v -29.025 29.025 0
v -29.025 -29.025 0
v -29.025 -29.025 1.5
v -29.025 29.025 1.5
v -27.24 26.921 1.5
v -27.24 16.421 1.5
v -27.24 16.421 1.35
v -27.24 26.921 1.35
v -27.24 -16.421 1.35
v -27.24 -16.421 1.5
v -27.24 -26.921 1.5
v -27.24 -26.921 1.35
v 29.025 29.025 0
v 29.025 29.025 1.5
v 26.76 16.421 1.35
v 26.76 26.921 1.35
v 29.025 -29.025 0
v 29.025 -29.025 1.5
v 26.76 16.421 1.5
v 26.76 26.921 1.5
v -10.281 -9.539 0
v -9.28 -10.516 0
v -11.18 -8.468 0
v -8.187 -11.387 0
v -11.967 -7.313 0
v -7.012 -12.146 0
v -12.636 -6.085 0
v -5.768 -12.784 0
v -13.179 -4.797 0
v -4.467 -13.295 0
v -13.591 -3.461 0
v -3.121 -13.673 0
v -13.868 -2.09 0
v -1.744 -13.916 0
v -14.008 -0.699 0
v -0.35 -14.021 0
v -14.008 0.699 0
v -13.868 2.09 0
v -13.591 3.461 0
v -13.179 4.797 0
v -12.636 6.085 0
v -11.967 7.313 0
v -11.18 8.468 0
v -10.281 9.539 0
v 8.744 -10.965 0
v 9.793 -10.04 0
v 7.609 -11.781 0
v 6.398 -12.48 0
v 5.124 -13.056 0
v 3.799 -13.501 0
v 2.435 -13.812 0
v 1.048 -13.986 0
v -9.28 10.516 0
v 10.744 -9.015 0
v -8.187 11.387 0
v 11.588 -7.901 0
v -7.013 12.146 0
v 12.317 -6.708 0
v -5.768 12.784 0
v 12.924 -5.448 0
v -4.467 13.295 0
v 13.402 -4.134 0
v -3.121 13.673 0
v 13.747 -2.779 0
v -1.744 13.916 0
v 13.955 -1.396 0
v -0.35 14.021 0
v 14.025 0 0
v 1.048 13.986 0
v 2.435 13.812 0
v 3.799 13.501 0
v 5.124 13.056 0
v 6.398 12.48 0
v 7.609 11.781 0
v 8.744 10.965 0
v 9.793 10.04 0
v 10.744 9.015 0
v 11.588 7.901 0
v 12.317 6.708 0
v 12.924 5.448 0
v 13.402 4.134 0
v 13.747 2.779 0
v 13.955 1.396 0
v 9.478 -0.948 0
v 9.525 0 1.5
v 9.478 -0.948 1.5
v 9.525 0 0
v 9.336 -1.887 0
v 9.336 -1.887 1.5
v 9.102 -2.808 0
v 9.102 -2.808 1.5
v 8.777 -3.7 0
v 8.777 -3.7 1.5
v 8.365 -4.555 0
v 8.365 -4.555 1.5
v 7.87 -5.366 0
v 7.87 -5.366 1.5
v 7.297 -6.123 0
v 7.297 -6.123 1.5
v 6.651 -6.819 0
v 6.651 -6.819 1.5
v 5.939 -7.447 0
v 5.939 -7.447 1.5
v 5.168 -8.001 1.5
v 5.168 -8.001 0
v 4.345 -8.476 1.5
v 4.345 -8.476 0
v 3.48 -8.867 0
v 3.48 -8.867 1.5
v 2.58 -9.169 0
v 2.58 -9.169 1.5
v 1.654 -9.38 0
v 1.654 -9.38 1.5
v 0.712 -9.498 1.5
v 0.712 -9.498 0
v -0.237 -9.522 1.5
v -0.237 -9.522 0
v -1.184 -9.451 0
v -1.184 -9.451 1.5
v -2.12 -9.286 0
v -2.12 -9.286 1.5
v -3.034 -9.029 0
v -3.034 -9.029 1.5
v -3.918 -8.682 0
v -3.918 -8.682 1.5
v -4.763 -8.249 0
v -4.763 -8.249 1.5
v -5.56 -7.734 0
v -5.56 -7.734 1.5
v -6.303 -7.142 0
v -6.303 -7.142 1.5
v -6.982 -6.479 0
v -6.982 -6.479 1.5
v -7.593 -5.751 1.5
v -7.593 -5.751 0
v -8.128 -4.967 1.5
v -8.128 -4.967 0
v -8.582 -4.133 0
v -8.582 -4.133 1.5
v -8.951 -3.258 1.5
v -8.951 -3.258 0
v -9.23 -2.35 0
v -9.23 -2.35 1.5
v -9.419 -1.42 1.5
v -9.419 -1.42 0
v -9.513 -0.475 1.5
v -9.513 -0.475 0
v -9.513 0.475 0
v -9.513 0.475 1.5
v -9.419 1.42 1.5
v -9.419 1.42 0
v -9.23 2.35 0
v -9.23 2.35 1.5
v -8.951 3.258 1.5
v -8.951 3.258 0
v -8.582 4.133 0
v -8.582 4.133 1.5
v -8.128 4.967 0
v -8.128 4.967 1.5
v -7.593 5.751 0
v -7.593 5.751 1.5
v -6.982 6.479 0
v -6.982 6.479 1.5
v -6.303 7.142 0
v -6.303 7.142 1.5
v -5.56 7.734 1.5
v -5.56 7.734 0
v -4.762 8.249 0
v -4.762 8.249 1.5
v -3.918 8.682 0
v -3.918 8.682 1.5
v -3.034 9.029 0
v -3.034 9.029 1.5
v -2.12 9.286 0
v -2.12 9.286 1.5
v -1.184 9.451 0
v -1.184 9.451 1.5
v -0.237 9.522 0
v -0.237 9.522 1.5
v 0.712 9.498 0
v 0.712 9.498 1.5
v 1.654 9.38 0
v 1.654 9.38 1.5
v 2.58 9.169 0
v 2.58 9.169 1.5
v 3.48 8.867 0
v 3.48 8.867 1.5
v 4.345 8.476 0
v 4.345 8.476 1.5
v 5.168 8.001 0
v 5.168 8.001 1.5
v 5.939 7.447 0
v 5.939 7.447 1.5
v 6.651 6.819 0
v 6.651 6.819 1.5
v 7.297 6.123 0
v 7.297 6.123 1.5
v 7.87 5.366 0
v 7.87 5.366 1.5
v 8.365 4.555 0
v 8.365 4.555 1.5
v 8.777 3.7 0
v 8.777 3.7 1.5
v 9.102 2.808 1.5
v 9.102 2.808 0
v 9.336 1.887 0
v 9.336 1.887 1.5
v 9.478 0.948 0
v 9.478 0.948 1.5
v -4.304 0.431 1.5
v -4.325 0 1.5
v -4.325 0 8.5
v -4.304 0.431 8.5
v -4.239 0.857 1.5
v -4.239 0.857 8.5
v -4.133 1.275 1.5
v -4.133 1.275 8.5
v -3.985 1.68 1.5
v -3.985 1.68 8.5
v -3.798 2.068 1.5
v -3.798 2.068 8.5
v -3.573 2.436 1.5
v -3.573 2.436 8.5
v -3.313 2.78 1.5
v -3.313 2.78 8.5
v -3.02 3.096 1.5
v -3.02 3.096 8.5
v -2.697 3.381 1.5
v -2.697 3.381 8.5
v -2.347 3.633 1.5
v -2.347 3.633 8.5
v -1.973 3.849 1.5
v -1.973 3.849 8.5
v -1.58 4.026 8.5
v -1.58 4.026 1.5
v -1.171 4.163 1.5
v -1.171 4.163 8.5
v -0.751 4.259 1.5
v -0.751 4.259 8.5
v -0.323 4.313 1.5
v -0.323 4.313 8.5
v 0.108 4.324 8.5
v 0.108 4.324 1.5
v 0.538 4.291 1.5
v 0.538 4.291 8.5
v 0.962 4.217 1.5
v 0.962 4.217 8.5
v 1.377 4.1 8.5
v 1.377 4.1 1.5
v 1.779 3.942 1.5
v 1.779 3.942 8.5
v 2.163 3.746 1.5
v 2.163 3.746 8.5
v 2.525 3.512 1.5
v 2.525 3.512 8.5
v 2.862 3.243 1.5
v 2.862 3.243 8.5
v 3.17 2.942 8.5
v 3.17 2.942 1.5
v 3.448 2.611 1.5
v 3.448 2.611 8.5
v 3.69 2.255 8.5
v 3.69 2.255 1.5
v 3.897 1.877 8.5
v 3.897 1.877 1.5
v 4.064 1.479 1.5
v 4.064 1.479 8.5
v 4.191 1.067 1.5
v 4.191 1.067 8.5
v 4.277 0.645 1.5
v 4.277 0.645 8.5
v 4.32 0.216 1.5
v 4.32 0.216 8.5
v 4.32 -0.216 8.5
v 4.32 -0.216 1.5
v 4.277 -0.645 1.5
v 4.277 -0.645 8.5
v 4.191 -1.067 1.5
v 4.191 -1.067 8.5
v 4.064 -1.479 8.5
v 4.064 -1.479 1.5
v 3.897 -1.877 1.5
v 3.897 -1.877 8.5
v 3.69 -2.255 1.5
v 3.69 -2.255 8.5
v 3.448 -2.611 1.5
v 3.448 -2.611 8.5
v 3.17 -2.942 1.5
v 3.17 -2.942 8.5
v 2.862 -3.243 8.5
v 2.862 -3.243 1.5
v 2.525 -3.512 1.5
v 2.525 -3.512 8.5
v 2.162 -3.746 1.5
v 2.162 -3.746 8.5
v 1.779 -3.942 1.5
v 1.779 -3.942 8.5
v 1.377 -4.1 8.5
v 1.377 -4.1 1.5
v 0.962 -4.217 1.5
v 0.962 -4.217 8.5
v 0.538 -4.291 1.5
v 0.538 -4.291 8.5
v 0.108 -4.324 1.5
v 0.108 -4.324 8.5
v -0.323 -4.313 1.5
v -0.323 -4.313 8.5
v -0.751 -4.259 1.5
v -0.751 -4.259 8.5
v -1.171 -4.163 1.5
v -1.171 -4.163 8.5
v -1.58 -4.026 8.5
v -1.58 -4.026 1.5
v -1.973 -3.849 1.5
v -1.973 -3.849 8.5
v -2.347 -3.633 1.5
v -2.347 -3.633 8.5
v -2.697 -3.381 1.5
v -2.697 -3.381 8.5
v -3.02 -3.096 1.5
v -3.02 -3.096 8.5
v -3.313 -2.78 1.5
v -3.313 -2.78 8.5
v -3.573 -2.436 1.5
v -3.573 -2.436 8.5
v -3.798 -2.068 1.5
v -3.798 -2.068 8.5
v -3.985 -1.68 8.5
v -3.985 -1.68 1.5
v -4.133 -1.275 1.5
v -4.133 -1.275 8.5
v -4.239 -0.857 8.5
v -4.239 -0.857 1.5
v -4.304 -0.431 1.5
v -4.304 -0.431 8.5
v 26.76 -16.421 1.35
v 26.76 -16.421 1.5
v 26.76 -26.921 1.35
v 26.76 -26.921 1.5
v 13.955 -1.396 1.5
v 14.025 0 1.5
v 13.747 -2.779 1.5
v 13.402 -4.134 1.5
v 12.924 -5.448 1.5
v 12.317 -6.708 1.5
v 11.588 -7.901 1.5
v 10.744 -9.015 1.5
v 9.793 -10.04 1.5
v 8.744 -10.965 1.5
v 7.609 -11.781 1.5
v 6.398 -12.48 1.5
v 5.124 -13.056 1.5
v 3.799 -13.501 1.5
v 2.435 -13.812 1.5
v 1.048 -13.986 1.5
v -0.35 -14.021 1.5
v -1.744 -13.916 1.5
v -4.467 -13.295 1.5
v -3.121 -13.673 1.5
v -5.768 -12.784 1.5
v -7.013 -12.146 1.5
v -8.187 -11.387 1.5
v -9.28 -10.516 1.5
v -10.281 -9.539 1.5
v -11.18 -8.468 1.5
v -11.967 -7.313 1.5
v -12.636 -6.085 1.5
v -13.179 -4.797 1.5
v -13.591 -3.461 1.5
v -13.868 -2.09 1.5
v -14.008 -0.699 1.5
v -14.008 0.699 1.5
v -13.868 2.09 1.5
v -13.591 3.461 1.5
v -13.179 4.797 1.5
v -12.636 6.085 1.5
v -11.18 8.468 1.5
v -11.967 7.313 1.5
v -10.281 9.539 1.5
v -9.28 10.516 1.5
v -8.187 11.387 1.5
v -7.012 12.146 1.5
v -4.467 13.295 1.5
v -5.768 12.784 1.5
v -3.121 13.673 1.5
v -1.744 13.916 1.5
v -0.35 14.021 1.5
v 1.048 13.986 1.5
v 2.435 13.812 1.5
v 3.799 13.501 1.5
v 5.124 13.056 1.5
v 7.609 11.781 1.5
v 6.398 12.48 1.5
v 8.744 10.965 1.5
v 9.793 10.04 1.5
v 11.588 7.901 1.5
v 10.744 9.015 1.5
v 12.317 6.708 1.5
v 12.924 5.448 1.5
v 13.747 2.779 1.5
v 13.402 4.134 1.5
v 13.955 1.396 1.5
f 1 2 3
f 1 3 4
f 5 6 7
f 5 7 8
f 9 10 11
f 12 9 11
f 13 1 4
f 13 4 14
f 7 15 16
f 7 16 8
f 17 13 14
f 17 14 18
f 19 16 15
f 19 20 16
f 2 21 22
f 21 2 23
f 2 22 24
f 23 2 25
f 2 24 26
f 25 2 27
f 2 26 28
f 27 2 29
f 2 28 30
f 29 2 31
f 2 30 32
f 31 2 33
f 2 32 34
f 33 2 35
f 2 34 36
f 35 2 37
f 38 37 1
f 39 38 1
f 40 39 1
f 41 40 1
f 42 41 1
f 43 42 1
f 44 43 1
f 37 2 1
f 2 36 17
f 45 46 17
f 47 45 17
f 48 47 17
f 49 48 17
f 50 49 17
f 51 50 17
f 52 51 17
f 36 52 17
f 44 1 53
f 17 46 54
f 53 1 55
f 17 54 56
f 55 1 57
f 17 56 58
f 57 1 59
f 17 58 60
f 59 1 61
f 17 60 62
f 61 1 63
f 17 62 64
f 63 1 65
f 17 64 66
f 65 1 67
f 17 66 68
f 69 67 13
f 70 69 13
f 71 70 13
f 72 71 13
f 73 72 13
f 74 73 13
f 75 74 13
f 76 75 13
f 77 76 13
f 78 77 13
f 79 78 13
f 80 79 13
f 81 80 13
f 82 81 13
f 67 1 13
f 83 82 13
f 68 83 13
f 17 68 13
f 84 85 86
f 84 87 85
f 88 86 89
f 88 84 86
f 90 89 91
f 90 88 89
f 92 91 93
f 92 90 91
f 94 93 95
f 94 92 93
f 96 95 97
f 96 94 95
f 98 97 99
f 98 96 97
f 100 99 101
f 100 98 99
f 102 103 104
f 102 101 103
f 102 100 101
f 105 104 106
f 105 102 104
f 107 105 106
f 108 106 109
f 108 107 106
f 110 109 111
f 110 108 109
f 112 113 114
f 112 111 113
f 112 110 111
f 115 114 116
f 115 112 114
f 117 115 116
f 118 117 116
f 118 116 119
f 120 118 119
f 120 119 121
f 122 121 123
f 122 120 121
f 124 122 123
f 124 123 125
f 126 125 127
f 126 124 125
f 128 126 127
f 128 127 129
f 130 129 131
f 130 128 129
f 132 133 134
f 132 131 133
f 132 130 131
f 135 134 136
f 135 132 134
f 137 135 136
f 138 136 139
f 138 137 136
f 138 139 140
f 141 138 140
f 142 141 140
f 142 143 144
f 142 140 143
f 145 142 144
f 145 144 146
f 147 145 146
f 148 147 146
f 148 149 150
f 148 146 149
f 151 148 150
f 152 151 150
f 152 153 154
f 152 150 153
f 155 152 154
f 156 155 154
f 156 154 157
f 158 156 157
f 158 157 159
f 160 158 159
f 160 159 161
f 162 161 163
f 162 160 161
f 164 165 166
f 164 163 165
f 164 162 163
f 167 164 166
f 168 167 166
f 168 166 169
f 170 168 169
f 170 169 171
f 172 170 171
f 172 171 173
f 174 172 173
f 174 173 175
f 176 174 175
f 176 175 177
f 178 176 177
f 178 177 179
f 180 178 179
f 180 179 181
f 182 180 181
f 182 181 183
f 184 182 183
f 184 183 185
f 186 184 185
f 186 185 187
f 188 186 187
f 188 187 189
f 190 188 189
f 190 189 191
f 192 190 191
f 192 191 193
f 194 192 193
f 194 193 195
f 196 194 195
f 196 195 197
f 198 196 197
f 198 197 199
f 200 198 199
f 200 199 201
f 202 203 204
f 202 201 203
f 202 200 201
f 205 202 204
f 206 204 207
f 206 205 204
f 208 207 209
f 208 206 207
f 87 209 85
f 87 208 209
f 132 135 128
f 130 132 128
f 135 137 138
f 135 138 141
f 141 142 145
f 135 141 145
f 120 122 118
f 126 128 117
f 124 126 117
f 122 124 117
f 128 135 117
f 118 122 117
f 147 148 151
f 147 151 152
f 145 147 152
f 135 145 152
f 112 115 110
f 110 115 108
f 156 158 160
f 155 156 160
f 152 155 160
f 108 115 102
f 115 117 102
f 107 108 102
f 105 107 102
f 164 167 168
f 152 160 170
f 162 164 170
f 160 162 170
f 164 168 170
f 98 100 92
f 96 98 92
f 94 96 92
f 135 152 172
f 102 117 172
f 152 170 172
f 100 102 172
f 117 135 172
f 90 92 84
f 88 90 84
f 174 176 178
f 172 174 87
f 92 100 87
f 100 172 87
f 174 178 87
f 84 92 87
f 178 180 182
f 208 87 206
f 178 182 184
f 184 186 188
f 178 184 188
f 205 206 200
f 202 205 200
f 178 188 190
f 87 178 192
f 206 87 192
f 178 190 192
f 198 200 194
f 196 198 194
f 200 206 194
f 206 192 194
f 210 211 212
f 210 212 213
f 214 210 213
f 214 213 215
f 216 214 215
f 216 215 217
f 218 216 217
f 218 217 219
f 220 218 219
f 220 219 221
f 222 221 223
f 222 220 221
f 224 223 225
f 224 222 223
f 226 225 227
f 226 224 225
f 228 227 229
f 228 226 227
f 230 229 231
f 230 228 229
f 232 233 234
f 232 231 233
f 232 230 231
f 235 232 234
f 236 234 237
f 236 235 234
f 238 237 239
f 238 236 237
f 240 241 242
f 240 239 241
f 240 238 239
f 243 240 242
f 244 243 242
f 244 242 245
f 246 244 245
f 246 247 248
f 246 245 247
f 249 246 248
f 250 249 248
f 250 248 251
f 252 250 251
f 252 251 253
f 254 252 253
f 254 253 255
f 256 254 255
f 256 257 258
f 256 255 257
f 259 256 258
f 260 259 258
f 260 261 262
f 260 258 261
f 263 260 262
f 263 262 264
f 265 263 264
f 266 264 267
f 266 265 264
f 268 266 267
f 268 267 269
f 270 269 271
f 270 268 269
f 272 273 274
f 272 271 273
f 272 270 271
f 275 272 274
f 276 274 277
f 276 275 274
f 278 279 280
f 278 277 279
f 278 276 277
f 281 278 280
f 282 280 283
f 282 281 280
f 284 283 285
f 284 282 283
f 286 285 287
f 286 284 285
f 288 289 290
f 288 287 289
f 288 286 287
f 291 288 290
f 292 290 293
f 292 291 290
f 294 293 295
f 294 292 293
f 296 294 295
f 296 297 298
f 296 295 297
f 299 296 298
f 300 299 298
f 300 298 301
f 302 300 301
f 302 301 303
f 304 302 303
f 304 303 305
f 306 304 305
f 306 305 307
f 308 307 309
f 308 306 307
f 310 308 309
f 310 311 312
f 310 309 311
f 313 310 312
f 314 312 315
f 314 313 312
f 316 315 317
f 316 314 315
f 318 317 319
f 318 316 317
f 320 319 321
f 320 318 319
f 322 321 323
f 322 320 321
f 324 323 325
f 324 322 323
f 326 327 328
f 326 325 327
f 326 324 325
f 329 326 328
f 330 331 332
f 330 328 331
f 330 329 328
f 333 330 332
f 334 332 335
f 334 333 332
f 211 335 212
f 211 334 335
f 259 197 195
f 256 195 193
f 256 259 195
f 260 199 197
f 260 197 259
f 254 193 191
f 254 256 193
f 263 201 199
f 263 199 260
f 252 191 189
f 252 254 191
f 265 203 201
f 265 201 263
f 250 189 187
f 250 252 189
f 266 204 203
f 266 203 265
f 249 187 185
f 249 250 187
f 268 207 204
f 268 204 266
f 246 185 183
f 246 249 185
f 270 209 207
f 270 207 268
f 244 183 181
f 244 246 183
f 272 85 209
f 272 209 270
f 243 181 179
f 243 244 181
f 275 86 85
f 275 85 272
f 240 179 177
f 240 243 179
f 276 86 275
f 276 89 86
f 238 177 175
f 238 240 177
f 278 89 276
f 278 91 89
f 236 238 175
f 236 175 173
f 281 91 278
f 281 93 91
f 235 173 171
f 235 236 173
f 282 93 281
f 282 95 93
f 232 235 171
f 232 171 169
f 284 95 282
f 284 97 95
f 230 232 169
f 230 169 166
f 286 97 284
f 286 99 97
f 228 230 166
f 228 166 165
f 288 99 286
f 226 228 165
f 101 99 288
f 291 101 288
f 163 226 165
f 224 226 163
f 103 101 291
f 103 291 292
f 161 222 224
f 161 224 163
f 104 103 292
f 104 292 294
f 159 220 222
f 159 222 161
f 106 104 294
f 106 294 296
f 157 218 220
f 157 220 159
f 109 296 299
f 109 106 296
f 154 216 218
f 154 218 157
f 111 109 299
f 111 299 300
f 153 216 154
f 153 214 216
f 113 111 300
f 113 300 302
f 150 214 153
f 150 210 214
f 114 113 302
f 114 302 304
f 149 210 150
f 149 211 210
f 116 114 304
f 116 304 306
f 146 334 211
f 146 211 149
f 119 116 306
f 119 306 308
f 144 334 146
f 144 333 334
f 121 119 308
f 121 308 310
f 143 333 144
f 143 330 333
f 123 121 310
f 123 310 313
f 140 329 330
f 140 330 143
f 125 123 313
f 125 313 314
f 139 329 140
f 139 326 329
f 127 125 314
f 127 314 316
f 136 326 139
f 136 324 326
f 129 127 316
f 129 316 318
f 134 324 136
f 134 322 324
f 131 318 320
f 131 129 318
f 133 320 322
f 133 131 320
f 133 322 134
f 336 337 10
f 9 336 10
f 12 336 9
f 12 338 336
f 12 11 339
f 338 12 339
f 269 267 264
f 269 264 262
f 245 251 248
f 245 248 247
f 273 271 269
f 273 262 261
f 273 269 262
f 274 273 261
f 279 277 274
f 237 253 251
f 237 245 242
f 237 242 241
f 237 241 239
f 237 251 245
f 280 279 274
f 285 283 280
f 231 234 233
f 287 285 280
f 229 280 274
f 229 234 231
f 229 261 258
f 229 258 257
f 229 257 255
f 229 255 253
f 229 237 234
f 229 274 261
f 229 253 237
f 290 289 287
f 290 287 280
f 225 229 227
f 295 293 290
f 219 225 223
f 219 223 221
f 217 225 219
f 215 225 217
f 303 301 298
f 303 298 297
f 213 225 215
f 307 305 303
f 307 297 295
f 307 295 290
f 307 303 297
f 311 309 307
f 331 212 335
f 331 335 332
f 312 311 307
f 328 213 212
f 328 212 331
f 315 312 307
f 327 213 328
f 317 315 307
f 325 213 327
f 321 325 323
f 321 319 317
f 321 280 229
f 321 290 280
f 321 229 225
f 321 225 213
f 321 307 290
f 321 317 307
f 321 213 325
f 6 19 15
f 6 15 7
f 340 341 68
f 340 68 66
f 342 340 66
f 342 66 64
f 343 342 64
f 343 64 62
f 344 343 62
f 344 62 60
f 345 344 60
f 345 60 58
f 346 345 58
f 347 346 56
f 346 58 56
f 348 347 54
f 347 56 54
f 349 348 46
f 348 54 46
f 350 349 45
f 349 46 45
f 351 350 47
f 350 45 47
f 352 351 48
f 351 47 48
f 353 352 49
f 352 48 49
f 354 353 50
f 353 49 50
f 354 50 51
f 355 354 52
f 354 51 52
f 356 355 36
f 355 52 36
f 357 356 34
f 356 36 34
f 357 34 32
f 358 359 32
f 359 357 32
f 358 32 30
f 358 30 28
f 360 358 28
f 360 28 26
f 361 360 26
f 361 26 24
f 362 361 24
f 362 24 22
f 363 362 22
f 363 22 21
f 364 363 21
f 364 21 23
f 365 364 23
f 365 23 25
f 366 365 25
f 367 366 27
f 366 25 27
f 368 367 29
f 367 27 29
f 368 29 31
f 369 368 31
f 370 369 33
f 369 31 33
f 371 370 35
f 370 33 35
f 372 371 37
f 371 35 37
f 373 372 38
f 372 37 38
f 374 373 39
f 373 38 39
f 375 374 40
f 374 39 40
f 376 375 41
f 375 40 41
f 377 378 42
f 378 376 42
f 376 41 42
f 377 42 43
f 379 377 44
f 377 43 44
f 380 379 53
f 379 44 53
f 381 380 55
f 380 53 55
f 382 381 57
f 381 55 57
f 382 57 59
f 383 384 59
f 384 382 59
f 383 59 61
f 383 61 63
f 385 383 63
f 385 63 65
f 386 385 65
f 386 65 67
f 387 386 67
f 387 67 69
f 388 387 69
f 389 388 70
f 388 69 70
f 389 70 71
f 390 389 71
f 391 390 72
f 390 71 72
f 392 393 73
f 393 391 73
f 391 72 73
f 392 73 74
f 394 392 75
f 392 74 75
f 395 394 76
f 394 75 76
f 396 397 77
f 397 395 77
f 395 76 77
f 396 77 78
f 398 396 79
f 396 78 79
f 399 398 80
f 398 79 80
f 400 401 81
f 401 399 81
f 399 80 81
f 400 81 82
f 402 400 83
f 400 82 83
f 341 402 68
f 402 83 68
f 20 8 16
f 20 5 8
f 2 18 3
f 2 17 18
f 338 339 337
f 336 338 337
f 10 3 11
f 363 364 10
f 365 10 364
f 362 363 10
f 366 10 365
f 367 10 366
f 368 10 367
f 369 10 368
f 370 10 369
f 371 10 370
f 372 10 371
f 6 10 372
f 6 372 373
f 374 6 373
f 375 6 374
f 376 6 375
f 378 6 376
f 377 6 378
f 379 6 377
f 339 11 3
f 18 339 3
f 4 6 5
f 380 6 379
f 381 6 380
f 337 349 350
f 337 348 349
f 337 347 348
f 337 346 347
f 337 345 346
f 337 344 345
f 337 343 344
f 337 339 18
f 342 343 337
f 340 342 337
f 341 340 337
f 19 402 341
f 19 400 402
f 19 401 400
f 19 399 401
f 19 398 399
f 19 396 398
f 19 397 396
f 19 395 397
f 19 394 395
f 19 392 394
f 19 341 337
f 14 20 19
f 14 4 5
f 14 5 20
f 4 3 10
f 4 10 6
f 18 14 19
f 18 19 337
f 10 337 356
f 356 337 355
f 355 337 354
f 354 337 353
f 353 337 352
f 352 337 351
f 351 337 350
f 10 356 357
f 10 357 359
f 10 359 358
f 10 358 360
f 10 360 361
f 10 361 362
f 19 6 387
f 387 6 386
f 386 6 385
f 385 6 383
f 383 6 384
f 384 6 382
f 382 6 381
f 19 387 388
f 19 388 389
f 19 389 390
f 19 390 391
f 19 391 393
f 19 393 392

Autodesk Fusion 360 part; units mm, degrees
sketch "Sketch1" plane through (0, 0, 0) normal (0, 0, 1) x (1, 0, 0)
  circle A0 centre (0, 0) radius 9.525
  dimension "d1" = 19.05
extrude "Extrude1" add sketch "Sketch1" along normal blind 1.5 makes body 1
sketch "Sketch2" plane through (0, 0, 1.5) normal (0, 0, 1) x (-1, 0, 0)
  circle A0 centre (0, 0) radius 9.525
  line L0 (7, -5.7371) -> (-6, -5.7371)
  line L1 (-6, -5.7371) -> (-6, 5.2629)
  line L2 (-6, 5.2629) -> (7, 5.2629)
  line L3 (7, 5.2629) -> (7, -5.7371)
  dimension "d4" = 13
  dimension "d5" = 11
extrude "Extrude2" cut sketch "Sketch2" against normal blind 0.15 contours L0 L1 L2 L3 bodies 1
sketch "Sketch3" plane through (0, 0, 0) normal (0, 0, 1) x (1, 0, 0)
  line L0 (6, 5.7371) -> (6, -5.2629)
  line L1 (6, -5.2629) -> (-7, -5.2629)
  line L2 (-7, -5.2629) -> (-7, 5.7371)
  line L3 (-7, 5.7371) -> (6, 5.7371)
  circle A0 centre (0, 0) radius 9.525
  circle A1 centre (0, 0) radius 14.025
  line L4 (0, 14.025) -> (0, 29.025)
  line L5 (-14.025, 0) -> (-29.025, 0)
  line L6 (-29.025, 0) -> (-29.025, 29.025)
  line L7 (-29.025, 29.025) -> (29.025, 29.025)
  line L8 (29.025, 29.025) -> (29.025, -29.025)
  line L9 (29.025, -29.025) -> (-29.025, -29.025)
  line L10 (-29.025, -29.025) -> (-29.025, 29.025)
  dimension "d8" = 4.5
  dimension "d9" = 15
  dimension "d10" = 15
  dimension "d11" = 58.05
  dimension "d12" = 58.05
extrude "Extrude3" add sketch "Sketch3" along normal blind 1.5 separate body contours A1 L4 L5 L7 L8 L9 L10 | A1 L4 L5 L6 L7 L10 makes body 2
sketch "Sketch4" plane through (0, 0, 1.5) normal (0, 0, 1) x (-1, 0, 0)
  circle A0 centre (0, 0) radius 14.025
  line L0 (29.025, 29.025) -> (-29.025, 29.025)
  line L1 (-29.025, 29.025) -> (-29.025, -29.025)
  line L2 (-29.025, -29.025) -> (29.025, -29.025)
  line L3 (29.025, -29.025) -> (29.025, 29.025)
  line L4 (27.2396, -26.9207) -> (-26.7604, -26.9207)
  line L5 (-26.7604, -26.9207) -> (-26.7604, -16.4207)
  line L6 (-26.7604, -16.4207) -> (27.2396, -16.4207)
  line L7 (27.2396, -16.4207) -> (27.2396, -26.9207)
  line L8 (0, 0) -> (-20.0107, 0)
  line L9 (-26.7604, 16.4207) -> (27.2396, 16.4207)
  line L10 (-26.7604, 26.9207) -> (-26.7604, 16.4207)
  line L11 (27.2396, 26.9207) -> (-26.7604, 26.9207)
  line L12 (27.2396, 16.4207) -> (27.2396, 26.9207)
  dimension "d15" = 54
  dimension "d16" = 10.5
extrude "Extrude4" cut sketch "Sketch4" against normal blind 0.15 contours L4 L5 L6 L7 | L9 L10 L11 L12 bodies 2
extrude "Extrude5" add 1 faces at (-2.6667, 2.0705, 1.35) along direction (0, 0, 1) blind 0.15 on bodies 1 bodies 1
sketch "Sketch5" plane through (0, 0, 1.5) normal (0, 0, 1) x (-1, 0, 0)
  circle A0 centre (0, 0) radius 9.525
  circle A1 centre (0, 0) radius 4.325
  dimension "d21" = 8.65
extrude "Extrude6" add sketch "Sketch5" along normal blind 7 contours A1 bodies 1
equation "d1 = 14.05 mm + 5 mm"
